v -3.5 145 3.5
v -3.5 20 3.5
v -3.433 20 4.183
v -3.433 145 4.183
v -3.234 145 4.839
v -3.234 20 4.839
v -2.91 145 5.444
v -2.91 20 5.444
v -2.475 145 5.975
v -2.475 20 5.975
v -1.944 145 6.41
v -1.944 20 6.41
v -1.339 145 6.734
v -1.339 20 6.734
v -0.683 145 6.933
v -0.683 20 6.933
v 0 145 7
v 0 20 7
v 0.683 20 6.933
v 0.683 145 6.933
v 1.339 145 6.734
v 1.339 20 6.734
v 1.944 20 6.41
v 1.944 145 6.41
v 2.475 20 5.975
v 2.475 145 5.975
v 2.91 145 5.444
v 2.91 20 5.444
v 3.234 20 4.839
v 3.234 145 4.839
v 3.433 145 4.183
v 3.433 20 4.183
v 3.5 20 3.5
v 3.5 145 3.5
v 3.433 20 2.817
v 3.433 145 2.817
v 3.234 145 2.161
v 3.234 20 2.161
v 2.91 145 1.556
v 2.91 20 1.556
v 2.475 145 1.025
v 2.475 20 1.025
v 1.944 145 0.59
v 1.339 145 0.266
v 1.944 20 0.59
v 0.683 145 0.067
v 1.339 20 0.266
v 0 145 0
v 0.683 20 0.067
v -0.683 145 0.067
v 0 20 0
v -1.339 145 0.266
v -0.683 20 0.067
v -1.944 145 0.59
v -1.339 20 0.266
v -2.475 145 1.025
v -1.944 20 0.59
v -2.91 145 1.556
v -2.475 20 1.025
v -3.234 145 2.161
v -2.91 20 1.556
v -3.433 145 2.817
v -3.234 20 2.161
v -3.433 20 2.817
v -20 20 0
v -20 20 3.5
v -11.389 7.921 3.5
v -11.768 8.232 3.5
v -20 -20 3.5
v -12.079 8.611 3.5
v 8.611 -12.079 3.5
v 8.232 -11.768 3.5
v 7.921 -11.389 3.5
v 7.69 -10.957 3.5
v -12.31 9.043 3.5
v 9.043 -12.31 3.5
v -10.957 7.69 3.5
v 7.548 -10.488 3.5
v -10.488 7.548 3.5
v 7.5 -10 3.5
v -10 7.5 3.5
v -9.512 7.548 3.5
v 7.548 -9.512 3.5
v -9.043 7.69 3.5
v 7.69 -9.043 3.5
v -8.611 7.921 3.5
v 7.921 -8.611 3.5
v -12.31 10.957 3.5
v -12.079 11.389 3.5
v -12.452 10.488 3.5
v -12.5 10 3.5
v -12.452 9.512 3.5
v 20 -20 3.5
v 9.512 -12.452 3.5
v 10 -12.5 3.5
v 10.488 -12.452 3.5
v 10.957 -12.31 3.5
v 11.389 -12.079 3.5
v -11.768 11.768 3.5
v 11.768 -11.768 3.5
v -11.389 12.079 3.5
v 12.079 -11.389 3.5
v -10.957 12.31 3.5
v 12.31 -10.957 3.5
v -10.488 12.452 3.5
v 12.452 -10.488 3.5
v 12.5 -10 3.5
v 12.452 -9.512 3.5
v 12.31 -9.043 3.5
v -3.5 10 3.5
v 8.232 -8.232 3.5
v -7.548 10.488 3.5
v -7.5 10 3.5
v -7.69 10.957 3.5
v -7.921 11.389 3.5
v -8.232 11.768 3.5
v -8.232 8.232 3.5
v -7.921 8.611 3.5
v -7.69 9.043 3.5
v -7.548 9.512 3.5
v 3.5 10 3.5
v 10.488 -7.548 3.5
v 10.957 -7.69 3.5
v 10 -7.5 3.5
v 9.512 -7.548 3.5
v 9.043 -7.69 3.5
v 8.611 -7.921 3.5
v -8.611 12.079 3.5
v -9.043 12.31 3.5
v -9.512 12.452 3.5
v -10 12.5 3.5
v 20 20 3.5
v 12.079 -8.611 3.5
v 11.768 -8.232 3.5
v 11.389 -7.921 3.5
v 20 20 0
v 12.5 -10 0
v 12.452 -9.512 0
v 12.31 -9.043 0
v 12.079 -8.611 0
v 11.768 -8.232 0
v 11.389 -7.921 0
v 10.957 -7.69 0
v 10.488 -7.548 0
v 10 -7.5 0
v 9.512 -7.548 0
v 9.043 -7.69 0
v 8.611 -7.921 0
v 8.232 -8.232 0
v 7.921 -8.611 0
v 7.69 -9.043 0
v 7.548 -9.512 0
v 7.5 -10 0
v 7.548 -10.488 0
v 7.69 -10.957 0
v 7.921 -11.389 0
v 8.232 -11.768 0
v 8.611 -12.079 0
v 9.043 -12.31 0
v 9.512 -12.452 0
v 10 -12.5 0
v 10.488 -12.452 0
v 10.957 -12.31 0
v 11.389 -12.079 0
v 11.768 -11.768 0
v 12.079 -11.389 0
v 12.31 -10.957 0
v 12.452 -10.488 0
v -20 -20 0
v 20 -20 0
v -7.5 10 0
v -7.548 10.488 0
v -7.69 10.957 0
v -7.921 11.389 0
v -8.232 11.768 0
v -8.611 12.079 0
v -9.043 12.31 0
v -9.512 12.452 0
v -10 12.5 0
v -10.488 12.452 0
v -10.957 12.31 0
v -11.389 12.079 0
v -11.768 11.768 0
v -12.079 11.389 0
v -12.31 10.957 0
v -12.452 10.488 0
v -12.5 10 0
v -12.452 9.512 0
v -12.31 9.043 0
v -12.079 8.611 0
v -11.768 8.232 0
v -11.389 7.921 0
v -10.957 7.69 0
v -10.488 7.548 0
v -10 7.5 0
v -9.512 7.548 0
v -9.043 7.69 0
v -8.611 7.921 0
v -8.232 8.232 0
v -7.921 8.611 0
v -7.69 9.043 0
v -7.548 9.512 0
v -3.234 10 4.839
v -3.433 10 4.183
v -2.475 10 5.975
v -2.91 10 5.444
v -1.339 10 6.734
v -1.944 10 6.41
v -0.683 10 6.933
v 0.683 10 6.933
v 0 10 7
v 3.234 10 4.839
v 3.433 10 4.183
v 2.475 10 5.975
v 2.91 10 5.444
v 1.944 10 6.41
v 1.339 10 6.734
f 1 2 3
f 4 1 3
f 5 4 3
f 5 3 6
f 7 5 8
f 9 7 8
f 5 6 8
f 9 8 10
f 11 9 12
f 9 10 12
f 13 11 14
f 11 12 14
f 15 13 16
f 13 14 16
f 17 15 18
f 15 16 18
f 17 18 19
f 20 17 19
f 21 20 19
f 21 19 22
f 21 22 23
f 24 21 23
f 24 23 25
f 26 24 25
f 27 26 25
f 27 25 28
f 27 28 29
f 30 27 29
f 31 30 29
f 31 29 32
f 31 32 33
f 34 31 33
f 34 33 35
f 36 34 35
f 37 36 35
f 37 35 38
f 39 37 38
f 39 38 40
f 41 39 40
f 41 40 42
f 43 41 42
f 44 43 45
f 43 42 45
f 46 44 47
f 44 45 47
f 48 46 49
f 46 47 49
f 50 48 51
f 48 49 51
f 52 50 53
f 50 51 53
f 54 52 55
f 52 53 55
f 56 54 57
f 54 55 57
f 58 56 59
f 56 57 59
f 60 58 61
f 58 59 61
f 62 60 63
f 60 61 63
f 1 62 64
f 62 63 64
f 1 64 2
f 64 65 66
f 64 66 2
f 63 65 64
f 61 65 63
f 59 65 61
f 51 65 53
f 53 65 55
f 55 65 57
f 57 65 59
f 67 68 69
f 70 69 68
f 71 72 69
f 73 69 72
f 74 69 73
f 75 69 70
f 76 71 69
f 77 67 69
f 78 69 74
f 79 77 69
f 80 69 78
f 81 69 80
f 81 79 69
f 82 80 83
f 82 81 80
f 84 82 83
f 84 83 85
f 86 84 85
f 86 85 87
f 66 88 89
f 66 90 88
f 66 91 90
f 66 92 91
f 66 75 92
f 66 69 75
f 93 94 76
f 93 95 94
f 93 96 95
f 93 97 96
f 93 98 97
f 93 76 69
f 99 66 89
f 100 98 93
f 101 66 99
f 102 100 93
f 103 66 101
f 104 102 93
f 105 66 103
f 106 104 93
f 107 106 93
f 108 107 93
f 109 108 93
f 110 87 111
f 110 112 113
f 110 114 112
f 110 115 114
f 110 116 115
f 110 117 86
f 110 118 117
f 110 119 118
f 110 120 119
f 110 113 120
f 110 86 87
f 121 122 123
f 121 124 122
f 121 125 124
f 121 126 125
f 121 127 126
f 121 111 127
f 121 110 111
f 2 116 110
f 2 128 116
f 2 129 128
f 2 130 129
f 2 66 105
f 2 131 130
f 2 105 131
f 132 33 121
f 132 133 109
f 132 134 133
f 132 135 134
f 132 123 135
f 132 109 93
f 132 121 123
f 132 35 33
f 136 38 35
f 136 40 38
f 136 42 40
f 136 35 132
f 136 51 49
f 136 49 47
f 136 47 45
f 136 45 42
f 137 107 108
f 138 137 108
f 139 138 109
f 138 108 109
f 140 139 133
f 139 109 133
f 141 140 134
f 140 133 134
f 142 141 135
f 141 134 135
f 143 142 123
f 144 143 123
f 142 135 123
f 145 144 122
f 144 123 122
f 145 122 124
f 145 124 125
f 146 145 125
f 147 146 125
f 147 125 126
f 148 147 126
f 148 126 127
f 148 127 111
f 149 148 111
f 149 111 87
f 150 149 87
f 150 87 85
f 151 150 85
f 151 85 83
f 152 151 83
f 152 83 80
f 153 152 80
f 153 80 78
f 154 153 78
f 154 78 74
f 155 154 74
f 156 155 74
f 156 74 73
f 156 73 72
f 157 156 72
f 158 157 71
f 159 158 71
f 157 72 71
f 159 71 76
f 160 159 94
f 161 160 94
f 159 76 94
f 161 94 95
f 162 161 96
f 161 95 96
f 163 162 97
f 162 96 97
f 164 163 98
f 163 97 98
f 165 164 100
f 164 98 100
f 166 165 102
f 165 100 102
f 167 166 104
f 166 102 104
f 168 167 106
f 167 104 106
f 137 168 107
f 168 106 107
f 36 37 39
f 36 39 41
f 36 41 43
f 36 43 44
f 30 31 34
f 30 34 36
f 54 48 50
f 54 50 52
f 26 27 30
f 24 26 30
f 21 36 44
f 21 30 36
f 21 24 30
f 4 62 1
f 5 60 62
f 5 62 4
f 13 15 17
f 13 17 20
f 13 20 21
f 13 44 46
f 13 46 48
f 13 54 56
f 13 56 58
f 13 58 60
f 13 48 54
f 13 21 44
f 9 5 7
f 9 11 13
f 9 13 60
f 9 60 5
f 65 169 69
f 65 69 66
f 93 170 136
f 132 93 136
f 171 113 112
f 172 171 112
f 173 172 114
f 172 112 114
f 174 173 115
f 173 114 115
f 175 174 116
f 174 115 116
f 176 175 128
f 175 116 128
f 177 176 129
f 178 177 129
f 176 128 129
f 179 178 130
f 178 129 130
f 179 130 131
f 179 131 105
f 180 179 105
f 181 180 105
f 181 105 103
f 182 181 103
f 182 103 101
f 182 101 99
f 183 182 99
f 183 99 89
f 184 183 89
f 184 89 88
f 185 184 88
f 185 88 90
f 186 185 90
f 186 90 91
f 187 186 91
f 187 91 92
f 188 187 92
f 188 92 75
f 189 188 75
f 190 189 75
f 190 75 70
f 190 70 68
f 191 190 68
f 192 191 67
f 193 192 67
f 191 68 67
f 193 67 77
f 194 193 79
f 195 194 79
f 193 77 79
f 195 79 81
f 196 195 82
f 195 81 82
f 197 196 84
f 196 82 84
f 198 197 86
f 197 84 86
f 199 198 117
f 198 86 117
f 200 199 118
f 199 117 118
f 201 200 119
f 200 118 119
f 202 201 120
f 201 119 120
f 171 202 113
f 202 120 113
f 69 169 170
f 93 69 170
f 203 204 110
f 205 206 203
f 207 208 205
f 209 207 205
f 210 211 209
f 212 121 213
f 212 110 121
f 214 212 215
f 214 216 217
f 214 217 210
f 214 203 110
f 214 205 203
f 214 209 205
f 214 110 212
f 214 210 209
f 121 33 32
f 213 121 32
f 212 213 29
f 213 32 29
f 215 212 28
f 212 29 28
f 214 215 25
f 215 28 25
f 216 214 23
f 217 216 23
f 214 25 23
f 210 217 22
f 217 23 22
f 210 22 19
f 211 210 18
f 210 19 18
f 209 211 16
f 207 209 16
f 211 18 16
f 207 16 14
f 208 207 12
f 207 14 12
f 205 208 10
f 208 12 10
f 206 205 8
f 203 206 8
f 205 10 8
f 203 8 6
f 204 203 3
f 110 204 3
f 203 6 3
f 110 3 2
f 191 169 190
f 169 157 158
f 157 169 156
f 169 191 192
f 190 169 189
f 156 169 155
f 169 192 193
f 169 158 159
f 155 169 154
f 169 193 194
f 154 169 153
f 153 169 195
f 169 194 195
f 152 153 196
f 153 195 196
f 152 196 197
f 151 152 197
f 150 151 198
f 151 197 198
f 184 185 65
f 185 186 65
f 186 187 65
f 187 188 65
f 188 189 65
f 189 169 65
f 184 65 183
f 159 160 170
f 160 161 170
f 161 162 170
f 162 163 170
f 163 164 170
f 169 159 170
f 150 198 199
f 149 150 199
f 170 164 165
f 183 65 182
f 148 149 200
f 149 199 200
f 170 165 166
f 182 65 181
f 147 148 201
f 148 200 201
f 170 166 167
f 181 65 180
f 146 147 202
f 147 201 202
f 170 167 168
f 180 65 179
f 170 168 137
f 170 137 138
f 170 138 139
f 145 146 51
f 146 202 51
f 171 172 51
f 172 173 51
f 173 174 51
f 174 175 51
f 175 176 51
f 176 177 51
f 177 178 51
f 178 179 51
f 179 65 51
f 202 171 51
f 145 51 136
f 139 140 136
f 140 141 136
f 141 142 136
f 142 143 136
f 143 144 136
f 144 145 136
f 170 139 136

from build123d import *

# Parameters (mm, degrees)
SKETCH_W     = 40
SKETCH_H     = 40
PAD_DEPTH    = 3.5
SKETCH001_R  = 2.5
POCKET_DEPTH = 5
SKETCH002_R  = 3.5
PAD001_DEPTH = 125
PAD002_DEPTH = 10


with BuildPart() as part:
    # Sketch → Pad (new body)
    with BuildSketch(Plane.XY):
        Rectangle(SKETCH_W, SKETCH_H)
    extrude(amount=PAD_DEPTH)

    # Sketch001 (on Face6 of Pad) → Pocket (cut)
    with BuildSketch(Plane.XY.offset(3.5)):
        with Locations((-10, 10)):
            Circle(SKETCH001_R)
        with Locations((10, -10)):
            Circle(SKETCH001_R)
    extrude(amount=-POCKET_DEPTH, mode=Mode.SUBTRACT)

    # Sketch002 (on Face1 of Pocket) → Pad001 (join)
    with BuildSketch(Plane(origin=(0, 20, 0), x_dir=(-1, 0, 0), z_dir=(0, 1, 0))):
        with Locations((0, 3.5)):
            Circle(SKETCH002_R)
    extrude(amount=PAD001_DEPTH)

    # Sketch003 (on Face11 of Pad001) → Pad002 (join)
    with BuildSketch(Plane.XZ.offset(-20)):
        with BuildLine():
            ThreePointArc((3.5, 3.5), (0, 7), (-3.5, 3.5))
            Line((-3.5, 3.5), (3.5, 3.5))
        make_face()
    extrude(amount=PAD002_DEPTH)


solid = part.part
